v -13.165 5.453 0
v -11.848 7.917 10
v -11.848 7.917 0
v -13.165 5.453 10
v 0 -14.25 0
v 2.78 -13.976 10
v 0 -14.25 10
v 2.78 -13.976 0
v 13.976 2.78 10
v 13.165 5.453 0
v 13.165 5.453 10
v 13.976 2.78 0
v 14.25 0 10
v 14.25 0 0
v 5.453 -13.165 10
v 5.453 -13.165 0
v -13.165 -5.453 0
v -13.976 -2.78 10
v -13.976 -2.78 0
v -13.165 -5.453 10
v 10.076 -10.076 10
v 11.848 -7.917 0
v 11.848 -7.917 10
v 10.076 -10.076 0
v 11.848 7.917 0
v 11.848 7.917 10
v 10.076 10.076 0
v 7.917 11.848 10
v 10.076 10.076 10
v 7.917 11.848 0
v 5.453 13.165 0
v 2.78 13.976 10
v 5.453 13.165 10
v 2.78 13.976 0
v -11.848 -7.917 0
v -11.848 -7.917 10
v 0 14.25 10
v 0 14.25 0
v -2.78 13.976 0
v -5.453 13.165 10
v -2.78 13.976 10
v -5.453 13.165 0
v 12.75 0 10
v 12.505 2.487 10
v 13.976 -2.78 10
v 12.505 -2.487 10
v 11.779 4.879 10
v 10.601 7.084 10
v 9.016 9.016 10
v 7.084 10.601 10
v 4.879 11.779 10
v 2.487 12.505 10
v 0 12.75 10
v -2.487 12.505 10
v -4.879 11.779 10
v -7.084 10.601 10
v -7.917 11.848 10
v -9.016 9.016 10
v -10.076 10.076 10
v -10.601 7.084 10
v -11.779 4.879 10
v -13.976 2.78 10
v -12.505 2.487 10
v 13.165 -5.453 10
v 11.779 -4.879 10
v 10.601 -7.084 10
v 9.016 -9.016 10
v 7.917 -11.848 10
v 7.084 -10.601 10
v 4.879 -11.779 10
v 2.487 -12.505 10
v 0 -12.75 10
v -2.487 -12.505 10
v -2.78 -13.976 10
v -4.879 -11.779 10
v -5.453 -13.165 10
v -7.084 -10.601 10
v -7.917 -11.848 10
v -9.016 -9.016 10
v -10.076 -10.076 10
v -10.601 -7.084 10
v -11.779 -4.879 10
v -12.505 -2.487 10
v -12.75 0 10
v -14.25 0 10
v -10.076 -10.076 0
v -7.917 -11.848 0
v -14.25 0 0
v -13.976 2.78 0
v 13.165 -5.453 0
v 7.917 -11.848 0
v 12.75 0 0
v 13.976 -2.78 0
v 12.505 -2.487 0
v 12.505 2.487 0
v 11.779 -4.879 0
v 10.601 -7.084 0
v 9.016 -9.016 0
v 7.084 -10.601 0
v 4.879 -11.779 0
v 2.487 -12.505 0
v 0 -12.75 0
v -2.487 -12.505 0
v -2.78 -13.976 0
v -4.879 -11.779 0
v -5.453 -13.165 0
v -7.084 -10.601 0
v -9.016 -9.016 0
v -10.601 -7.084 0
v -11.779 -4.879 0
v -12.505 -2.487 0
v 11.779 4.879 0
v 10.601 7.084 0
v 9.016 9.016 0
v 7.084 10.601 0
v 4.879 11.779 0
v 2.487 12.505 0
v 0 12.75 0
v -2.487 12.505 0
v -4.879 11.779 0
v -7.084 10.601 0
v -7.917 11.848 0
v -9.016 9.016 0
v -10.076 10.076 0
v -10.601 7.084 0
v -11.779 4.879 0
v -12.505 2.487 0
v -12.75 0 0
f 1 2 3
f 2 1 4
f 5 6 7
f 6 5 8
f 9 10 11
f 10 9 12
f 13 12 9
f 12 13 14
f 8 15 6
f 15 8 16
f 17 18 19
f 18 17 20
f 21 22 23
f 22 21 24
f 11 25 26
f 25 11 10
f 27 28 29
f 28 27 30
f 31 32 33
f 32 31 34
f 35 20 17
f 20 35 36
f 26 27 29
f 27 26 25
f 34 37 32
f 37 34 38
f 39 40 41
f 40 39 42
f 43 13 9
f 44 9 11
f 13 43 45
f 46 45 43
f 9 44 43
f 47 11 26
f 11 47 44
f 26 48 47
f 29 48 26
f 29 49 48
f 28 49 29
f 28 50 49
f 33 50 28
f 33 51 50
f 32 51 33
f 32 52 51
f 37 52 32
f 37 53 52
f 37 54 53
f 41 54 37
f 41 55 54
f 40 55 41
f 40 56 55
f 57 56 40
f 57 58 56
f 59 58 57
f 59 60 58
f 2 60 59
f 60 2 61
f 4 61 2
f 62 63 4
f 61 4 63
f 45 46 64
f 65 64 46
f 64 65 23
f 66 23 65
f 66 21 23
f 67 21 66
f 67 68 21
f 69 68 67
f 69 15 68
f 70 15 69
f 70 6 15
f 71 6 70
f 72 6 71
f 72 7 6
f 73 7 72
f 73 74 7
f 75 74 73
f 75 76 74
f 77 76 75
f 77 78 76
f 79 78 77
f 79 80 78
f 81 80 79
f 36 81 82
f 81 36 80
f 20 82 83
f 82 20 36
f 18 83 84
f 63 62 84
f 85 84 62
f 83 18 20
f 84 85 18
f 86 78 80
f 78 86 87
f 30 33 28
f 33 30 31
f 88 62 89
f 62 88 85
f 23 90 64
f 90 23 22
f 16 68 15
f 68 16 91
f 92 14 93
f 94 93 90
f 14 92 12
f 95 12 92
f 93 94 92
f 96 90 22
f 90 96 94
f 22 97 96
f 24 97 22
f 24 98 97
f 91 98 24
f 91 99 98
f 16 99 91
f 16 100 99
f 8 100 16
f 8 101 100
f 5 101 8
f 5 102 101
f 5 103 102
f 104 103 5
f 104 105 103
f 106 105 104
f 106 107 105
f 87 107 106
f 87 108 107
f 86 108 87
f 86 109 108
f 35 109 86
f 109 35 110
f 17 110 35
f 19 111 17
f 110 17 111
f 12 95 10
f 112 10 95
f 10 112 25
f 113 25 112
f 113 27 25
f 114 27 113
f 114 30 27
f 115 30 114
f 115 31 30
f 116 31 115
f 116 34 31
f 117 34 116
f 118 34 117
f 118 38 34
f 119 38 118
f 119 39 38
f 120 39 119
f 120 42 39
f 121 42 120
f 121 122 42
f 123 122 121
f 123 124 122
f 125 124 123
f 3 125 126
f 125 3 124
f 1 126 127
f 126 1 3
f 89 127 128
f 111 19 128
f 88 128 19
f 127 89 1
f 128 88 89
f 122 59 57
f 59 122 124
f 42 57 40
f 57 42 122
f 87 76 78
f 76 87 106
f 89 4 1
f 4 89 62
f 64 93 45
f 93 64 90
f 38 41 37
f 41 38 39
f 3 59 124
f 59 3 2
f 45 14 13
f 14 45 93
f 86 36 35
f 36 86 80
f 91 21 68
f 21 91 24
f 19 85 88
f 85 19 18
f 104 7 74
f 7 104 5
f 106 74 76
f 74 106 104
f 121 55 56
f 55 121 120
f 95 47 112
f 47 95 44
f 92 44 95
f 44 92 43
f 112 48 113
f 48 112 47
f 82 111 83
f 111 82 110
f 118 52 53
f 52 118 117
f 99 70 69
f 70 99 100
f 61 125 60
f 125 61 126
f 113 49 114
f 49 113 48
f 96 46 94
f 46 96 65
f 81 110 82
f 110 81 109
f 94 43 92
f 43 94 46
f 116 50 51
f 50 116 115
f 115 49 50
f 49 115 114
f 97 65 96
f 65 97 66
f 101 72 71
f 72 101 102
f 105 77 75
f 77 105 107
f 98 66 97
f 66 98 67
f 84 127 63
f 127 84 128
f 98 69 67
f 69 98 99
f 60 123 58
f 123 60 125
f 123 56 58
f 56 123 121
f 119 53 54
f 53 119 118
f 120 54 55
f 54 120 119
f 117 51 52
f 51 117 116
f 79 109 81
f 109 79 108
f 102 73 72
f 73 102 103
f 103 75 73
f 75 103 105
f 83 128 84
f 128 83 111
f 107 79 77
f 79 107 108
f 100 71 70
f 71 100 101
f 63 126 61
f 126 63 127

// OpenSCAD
$fn = 32;

// ----------------------------------------------------------------------
// Spacer sleeve: 28.5 / 25.5 x 10 mm
// ----------------------------------------------------------------------

// --- parameters (mm) ---
tube_d = 28.5;            // outside diameter
bore_d = 25.5;            // shaft bore
tube_l = 10;              // sleeve length
step_d = 28.2;            // reduced diameter
step_l = 4.2;             // length of the step

module sleeve() {
  cylinder(h = tube_l, d = tube_d);
  translate([0, 0, tube_l - step_l]) cylinder(h = step_l, d = step_d);
}

difference() {
  sleeve();
  translate([0, 0, -1]) cylinder(h = tube_l + 2, d = bore_d);
}
